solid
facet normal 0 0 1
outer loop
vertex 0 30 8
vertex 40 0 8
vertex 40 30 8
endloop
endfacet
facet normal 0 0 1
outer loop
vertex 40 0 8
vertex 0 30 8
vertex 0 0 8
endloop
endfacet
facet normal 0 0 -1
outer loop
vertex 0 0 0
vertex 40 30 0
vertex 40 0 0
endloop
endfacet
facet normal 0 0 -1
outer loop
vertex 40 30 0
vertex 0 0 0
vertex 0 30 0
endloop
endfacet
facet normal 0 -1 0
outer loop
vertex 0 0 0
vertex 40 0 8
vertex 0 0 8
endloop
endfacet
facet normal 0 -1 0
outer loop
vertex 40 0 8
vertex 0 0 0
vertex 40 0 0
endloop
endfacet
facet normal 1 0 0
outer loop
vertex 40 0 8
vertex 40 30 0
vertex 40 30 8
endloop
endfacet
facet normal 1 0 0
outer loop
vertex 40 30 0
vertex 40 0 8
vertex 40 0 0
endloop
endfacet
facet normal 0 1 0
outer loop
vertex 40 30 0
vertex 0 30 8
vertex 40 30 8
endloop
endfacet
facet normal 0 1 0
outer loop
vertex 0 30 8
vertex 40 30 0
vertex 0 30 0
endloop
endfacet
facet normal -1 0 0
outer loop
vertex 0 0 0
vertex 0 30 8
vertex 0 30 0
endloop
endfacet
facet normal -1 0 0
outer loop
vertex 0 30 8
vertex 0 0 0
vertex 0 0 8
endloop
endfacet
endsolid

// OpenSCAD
module rectangular_box(length, width, height) {
  cube([length, width, height]);
}

rectangular_box(40, 30, 8);
